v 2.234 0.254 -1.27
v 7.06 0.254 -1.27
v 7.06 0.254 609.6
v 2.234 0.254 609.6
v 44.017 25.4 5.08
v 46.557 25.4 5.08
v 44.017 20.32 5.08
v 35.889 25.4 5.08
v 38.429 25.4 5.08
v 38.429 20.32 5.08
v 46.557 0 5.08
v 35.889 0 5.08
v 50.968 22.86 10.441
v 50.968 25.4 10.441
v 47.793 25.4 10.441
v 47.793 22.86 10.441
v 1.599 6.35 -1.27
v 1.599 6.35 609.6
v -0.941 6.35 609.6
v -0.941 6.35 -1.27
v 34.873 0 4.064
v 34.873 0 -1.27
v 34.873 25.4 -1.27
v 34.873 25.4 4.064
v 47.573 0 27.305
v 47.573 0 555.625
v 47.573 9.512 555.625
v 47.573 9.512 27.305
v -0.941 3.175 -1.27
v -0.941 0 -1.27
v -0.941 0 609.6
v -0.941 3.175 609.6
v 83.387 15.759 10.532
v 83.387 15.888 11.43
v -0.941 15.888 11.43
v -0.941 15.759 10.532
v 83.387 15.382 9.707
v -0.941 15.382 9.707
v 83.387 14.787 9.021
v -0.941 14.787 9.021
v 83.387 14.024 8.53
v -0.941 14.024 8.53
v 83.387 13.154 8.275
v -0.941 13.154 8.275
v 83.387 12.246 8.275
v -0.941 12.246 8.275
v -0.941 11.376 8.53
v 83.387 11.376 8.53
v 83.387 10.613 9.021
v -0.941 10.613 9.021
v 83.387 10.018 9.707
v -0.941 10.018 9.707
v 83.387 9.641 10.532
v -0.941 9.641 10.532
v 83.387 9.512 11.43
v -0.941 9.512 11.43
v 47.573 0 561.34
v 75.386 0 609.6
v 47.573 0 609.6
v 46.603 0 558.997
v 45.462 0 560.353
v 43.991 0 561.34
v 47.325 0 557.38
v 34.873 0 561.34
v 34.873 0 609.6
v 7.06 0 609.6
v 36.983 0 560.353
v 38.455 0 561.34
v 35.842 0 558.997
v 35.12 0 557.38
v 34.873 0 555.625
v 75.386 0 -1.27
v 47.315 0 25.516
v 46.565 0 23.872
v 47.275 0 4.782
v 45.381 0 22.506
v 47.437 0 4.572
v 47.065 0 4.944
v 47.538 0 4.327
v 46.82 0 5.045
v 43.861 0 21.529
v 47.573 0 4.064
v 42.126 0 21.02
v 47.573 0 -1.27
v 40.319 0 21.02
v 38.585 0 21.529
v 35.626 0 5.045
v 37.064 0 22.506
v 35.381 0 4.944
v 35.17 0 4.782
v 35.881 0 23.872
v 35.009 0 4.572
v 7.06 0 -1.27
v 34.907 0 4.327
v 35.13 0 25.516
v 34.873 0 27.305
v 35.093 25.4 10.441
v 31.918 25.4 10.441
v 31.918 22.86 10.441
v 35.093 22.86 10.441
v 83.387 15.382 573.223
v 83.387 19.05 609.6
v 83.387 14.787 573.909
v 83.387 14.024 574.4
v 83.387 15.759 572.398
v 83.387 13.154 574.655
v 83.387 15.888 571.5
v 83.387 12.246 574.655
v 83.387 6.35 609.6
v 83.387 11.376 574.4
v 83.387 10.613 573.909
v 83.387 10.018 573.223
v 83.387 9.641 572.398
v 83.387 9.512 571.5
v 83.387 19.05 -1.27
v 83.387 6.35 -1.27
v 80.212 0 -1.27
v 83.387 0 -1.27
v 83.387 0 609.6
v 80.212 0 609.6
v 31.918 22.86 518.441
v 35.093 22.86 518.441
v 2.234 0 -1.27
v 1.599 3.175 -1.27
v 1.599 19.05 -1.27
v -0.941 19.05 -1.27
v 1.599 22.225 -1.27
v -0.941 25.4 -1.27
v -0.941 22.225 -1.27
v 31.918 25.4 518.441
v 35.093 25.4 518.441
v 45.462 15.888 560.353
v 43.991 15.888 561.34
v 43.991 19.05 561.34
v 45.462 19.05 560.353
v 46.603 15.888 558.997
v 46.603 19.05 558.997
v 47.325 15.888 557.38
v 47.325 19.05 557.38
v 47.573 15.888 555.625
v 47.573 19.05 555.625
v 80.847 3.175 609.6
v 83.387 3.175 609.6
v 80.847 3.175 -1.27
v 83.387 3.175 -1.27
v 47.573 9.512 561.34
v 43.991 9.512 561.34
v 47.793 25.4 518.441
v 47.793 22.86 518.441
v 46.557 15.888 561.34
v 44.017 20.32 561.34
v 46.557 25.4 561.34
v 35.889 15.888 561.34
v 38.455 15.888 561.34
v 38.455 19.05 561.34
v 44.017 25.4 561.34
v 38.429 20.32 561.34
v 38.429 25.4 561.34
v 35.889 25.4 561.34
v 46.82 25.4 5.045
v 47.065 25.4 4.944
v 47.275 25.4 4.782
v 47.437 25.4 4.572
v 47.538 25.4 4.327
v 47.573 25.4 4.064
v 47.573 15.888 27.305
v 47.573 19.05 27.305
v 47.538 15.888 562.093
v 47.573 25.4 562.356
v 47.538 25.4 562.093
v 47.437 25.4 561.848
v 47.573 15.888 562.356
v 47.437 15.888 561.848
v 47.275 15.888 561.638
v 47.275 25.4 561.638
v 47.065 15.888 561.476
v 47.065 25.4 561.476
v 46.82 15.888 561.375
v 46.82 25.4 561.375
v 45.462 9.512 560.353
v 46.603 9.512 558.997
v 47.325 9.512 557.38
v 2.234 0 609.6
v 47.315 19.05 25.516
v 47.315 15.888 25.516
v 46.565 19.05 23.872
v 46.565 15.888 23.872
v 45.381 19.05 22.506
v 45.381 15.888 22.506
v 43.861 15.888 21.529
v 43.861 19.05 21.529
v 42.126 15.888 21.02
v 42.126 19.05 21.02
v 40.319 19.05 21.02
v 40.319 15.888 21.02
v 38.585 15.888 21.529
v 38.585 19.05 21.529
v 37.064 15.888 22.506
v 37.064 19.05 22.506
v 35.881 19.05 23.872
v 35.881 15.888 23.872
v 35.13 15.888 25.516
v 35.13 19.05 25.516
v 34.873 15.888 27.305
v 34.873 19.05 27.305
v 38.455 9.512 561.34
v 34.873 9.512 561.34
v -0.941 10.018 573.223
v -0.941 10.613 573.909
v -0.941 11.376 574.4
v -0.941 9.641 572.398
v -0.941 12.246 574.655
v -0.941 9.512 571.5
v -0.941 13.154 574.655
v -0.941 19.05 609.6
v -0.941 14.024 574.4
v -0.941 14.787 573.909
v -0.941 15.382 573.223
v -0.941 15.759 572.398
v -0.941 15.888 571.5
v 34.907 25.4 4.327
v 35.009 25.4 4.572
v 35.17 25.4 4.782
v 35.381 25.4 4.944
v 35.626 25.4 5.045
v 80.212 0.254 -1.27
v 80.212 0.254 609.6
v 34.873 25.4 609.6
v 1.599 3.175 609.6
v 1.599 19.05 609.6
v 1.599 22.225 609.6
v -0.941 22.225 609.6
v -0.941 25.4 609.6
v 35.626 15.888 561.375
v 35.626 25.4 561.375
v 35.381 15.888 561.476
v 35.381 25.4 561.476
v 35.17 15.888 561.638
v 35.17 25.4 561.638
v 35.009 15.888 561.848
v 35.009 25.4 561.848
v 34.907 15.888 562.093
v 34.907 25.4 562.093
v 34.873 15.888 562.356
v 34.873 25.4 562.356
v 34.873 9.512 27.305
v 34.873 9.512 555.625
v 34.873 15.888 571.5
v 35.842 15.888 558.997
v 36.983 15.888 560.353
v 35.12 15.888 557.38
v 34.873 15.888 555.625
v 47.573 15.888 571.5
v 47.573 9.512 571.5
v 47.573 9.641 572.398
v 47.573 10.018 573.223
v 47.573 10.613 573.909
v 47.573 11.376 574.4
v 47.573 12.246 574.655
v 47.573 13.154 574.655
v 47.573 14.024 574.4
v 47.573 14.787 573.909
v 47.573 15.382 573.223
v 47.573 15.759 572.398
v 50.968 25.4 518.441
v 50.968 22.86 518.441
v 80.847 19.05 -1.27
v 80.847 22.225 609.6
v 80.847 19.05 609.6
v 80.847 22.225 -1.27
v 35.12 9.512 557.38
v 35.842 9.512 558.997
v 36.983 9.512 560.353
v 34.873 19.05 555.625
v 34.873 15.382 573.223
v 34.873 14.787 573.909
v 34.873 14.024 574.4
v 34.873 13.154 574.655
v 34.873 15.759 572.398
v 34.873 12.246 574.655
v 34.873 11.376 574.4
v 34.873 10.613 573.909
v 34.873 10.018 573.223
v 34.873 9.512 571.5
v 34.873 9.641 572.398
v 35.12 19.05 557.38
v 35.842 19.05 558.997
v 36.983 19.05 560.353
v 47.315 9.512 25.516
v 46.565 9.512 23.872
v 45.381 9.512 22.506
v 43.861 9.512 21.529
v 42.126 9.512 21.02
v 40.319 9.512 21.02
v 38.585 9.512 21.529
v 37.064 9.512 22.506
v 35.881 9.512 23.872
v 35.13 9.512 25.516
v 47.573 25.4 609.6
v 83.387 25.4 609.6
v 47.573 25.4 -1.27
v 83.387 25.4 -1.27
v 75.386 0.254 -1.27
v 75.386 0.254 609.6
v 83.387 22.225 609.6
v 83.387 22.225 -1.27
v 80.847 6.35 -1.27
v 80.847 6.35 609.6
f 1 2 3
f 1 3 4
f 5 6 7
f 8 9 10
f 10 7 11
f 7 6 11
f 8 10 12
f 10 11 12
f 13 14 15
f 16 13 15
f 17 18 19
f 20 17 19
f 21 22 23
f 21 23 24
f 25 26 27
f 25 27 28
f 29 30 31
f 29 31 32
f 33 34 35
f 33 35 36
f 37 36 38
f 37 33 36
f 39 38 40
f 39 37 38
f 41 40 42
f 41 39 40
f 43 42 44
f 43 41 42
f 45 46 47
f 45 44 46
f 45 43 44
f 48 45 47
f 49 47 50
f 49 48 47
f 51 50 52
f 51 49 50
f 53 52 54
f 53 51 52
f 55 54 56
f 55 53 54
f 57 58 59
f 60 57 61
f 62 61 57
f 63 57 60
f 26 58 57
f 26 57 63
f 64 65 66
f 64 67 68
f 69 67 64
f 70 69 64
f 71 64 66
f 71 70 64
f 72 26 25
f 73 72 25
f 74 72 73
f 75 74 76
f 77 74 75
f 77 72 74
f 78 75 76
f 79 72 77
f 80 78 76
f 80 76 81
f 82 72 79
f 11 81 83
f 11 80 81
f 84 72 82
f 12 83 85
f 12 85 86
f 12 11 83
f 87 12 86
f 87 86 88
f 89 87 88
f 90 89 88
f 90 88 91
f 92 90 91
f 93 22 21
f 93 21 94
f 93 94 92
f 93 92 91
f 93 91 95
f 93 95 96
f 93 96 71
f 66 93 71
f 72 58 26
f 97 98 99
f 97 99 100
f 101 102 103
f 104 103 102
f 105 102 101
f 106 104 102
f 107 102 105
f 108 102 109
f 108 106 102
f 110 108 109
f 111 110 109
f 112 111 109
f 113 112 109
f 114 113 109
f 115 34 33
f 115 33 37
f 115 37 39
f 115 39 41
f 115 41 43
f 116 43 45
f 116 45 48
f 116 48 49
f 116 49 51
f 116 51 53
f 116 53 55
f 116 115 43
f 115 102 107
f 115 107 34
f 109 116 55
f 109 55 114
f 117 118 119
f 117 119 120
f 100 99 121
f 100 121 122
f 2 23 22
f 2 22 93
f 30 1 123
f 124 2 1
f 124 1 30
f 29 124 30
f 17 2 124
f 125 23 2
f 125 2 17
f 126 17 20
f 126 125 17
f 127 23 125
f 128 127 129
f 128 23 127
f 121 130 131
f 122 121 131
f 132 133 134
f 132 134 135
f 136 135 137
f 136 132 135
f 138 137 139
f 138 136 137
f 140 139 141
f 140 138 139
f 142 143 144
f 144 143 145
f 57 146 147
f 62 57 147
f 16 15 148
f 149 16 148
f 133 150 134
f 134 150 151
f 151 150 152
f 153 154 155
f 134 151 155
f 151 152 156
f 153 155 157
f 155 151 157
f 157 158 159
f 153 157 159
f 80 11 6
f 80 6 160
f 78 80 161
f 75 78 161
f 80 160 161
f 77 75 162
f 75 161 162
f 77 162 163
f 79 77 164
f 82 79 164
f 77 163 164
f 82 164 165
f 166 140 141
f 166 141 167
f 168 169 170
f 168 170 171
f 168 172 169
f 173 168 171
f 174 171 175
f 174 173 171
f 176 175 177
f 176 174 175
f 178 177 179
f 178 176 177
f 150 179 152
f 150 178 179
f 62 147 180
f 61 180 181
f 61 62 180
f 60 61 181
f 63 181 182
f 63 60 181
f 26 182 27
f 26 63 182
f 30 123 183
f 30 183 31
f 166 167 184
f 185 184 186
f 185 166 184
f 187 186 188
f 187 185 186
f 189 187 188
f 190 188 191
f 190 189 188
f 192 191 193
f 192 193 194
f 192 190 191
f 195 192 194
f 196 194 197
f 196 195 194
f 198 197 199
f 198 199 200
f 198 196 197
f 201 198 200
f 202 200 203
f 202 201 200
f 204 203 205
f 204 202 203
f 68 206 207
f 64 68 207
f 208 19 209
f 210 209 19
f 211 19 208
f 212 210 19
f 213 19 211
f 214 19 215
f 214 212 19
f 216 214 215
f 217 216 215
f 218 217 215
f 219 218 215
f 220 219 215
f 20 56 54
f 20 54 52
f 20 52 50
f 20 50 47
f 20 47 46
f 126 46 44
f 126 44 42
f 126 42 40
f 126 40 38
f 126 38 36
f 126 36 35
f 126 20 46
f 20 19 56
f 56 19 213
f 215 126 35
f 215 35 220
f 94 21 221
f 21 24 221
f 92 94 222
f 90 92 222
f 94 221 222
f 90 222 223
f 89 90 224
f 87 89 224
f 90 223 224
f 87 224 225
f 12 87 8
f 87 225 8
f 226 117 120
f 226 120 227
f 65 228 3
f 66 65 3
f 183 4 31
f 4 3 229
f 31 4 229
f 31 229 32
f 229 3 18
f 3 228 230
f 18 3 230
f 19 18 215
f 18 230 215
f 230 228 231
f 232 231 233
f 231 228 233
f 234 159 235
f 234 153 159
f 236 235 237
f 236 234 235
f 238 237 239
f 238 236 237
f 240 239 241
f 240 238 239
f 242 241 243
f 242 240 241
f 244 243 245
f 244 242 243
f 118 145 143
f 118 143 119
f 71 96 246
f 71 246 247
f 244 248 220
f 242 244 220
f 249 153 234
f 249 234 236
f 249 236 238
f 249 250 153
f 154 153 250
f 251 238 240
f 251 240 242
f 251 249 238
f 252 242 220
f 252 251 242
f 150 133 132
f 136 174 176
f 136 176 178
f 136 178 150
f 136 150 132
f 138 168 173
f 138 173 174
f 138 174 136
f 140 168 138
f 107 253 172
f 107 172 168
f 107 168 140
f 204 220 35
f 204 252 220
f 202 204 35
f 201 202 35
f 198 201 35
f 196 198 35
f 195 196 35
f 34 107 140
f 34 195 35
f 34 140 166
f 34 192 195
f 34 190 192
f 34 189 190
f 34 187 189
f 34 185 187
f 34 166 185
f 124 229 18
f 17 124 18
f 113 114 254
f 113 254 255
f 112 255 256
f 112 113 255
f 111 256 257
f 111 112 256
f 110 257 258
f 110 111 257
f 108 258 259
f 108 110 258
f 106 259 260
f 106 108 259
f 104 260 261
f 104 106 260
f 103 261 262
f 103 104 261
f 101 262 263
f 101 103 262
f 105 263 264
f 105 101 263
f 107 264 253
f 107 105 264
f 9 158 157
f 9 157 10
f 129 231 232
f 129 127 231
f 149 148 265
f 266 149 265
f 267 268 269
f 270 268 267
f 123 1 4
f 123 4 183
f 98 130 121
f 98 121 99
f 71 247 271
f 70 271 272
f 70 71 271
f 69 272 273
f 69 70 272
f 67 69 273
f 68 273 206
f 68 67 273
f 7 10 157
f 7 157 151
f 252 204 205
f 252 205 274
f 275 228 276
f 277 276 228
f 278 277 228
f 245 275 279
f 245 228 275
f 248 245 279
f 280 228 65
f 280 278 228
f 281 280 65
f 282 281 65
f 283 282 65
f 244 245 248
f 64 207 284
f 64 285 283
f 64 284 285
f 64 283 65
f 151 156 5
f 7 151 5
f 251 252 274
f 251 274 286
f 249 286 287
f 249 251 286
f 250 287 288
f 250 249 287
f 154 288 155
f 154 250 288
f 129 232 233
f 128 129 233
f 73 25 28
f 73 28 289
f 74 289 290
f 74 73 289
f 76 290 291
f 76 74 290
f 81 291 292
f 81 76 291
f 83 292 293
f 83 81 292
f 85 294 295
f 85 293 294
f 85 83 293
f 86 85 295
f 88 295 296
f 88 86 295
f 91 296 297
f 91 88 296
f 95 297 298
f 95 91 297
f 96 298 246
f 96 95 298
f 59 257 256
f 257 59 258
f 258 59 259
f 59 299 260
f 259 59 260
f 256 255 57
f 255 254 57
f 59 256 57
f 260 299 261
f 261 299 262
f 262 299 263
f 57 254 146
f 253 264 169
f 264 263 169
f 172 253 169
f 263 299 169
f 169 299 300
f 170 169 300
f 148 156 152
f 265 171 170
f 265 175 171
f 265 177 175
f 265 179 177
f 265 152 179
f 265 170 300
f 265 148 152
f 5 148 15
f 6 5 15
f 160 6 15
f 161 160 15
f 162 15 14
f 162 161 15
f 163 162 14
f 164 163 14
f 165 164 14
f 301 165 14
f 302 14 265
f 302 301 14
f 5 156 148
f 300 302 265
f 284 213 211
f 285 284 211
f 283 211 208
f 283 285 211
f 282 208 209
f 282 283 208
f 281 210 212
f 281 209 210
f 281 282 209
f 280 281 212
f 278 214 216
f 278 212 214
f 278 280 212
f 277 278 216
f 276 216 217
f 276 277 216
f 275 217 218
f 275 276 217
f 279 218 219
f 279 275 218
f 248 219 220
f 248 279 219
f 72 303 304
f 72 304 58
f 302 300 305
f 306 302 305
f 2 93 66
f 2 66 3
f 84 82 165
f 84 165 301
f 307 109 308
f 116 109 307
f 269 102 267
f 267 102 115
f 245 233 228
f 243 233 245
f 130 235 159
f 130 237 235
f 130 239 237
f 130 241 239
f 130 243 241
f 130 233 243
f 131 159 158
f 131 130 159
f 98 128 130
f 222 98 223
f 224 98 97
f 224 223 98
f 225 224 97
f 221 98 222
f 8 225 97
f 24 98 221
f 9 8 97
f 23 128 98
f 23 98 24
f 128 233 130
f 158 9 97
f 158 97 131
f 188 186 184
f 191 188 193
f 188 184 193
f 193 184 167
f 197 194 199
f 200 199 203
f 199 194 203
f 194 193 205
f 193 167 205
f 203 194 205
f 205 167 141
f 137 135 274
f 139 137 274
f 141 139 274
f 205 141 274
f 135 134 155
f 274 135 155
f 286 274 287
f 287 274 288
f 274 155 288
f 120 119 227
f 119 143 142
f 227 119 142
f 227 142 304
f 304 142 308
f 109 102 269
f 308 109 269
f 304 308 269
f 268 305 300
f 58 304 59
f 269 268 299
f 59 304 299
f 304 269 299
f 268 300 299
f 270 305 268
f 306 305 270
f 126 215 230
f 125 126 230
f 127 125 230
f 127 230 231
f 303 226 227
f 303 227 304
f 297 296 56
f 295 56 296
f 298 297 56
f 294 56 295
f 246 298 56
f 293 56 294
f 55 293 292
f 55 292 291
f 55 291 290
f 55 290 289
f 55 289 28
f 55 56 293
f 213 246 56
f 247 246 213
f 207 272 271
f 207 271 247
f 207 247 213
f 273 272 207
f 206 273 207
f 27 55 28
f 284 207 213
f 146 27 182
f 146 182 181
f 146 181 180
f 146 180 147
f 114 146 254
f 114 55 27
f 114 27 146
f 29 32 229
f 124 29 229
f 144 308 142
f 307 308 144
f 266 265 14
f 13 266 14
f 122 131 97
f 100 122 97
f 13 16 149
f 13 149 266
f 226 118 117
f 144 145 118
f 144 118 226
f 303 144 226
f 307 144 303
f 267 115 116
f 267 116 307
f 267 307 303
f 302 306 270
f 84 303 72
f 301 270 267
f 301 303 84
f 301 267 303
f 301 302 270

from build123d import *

# Parameters (mm, degrees)
BOSS_EXTRUDE1_DEPTH      = 584.2
BOSS_EXTRUDE1_DEPTH_BACK = 1.27
CUT_EXTRUDE1_DEPTH       = 19.05
SKETCH3_W                = 585.47
SKETCH3_H                = 3.175
CUT_EXTRUDE2_DEPTH       = 2.54
SKETCH4_W                = 585.47
SKETCH4_H                = 3.175
CUT_EXTRUDE3_DEPTH       = 2.54
SKETCH5_W                = 585.47
SKETCH5_H                = 3.175
CUT_EXTRUDE4_DEPTH       = 2.54
SKETCH6_W                = 585.47
SKETCH6_H                = 3.175
CUT_EXTRUDE5_DEPTH       = 2.54
CUT_EXTRUDE6_DEPTH       = 591.801160784
CUT_EXTRUDE8_DEPTH       = 591.667532064
FILLET4_R                = 1.016
CUT_EXTRUDE9_DEPTH       = 591.667532064
FILLET5_R                = 1.016
SKETCH12_W               = 3.175
SKETCH12_H               = 508
CUT_EXTRUDE10_DEPTH      = 2.54
BOSS_EXTRUDE3_DEPTH      = 25.4
SKETCH13_W               = 5.588
SKETCH13_H               = 635
CUT_EXTRUDE11_DEPTH      = 5.08


with BuildPart() as part:
    # Sketch1 → Boss-Extrude1 (new, two sides: drawn at the far end of the back side and taken through both)
    with BuildSketch(Plane.XY.offset(-BOSS_EXTRUDE1_DEPTH_BACK)):
        Polygon((83.386650215, 0), (80.211650215, 0), (80.211650215, 0.254), (75.385650215, 0.254), (75.385650215, 0), (7.059650215, 0), (7.059650215, 0.254), (2.233650215, 0.254), (2.233650215, 0), (-0.941349785, 0), (-0.941349785, 25.4), (83.386650215, 25.4), align=None)
    extrude(amount=BOSS_EXTRUDE1_DEPTH + BOSS_EXTRUDE1_DEPTH_BACK)

    # Sketch2 → Cut-Extrude1 (cut)
    with BuildSketch(Plane.XZ):
        with BuildLine():
            Line((34.872650215, 27.305), (34.872650215, 555.625))
            ThreePointArc((34.872650215, 555.625), (41.222650215, 561.975), (47.572650215, 555.625))
            Line((47.572650215, 555.625), (47.572650215, 27.305))
            ThreePointArc((47.572650215, 27.305), (41.222650215, 20.955), (34.872650215, 27.305))
        make_face()
    extrude(amount=-CUT_EXTRUDE1_DEPTH, mode=Mode.SUBTRACT)

    # Sketch3 → Cut-Extrude2 (cut)
    with BuildSketch(Plane(origin=(83.386650215, 0, 0), x_dir=(0, 0, -1), z_dir=(1, 0, 0))):
        with Locations((-291.465, 20.6375)):
            Rectangle(SKETCH3_W, SKETCH3_H)
    extrude(amount=-CUT_EXTRUDE2_DEPTH, mode=Mode.SUBTRACT)

    # Sketch4 → Cut-Extrude3 (cut)
    with BuildSketch(Plane(origin=(83.386650215, 0, 0), x_dir=(0, 0, -1), z_dir=(1, 0, 0))):
        with Locations((-291.465, 4.7625)):
            Rectangle(SKETCH4_W, SKETCH4_H)
    extrude(amount=-CUT_EXTRUDE3_DEPTH, mode=Mode.SUBTRACT)

    # Sketch5 → Cut-Extrude4 (cut)
    with BuildSketch(Plane.ZY.offset(0.941349785)):
        with Locations((291.465, 4.7625)):
            Rectangle(SKETCH5_W, SKETCH5_H)
    extrude(amount=-CUT_EXTRUDE4_DEPTH, mode=Mode.SUBTRACT)

    # Sketch6 → Cut-Extrude5 (cut)
    with BuildSketch(Plane.ZY.offset(0.941349785)):
        with Locations((291.465, 20.6375)):
            Rectangle(SKETCH6_W, SKETCH6_H)
    extrude(amount=-CUT_EXTRUDE5_DEPTH, mode=Mode.SUBTRACT)

    # Sketch7 → Cut-Extrude6 (cut, through all)
    with BuildSketch(Plane(origin=(83.386650215, 0, 0), x_dir=(0, 0, -1), z_dir=(1, 0, 0))):
        with BuildLine():
            Line((-11.43, 9.5123), (-571.5, 9.5123))
            ThreePointArc((-571.5, 9.5123), (-574.6877, 12.7), (-571.5, 15.8877))
            Line((-571.5, 15.8877), (-11.43, 15.8877))
            ThreePointArc((-11.43, 15.8877), (-8.2423, 12.7), (-11.43, 9.5123))
        make_face()
    extrude(amount=-CUT_EXTRUDE6_DEPTH, mode=Mode.SUBTRACT)

    # Sketch10 → Cut-Extrude8 (cut, through all)
    with BuildSketch(Plane(origin=(0, 25.4, 0), x_dir=(1, 0, 0), z_dir=(0, 1, 0))):
        Polygon((41.222650215, -584.2), (47.572650215, -584.2), (47.572650215, -561.34), (34.872650215, -561.34), (34.872650215, -584.2), align=None)
    extrude(amount=-CUT_EXTRUDE8_DEPTH, mode=Mode.SUBTRACT)

    # Fillet4
    fillet4_edges = [part.edges().sort_by_distance(p)[0] for p in [
        (47.572650215, 20.64385, 561.34),
        (34.872650215, 20.64385, 561.34),
    ]]
    fillet(fillet4_edges, radius=FILLET4_R)

    # Sketch9 → Cut-Extrude9 (cut, through all)
    with BuildSketch(Plane.XZ):
        Polygon((47.572650215, -1.27), (34.872650215, -1.27), (34.872650215, 5.08), (41.222650215, 5.08), (47.572650215, 5.08), align=None)
    extrude(amount=-CUT_EXTRUDE9_DEPTH, mode=Mode.SUBTRACT)

    # Fillet5
    fillet5_edges = [part.edges().sort_by_distance(p)[0] for p in [
        (47.572650215, 12.7, 5.08),
        (34.872650215, 12.7, 5.08),
    ]]
    fillet(fillet5_edges, radius=FILLET5_R)

    # Sketch12 → Cut-Extrude10 (cut)
    with BuildSketch(Plane(origin=(0, 25.4, 0), x_dir=(1, 0, 0), z_dir=(0, 1, 0))):
        with Locations((33.505889839, -264.440775348)):
            Rectangle(SKETCH12_W, SKETCH12_H)
        Polygon((47.793389839, -10.440775348), (47.793389839, -13.508701224), (47.793389839, -20.346727485), (47.793389839, -518.440775348), (50.968389839, -518.440775348), (50.968389839, -10.440775348), align=None)
    extrude(amount=-CUT_EXTRUDE10_DEPTH, mode=Mode.SUBTRACT)

    # Sketch15 → Boss-Extrude3 (add)
    with BuildSketch(Plane.XY.offset(584.2)):
        Polygon((-0.941349785, 25.4), (34.872650215, 25.4), (34.872650215, 0), (7.059650215, 0), (7.059650215, 0.254), (2.233650215, 0.254), (2.233650215, 0), (-0.941349785, 0), (-0.941349785, 3.175), (1.598650215, 3.175), (1.598650215, 6.35), (-0.941349785, 6.35), (-0.941349785, 19.05), (1.598650215, 19.05), (1.598650215, 22.225), (-0.941349785, 22.225), align=None)
        Polygon((47.572650215, 0), (47.572650215, 25.4), (83.386650215, 25.4), (83.386650215, 22.225), (80.846650215, 22.225), (80.846650215, 19.05), (83.386650215, 19.05), (83.386650215, 6.35), (80.846650215, 6.35), (80.846650215, 3.175), (83.386650215, 3.175), (83.386650215, 0), (80.211650215, 0), (80.211650215, 0.254), (75.385650215, 0.254), (75.385650215, 0), align=None)
    extrude(amount=BOSS_EXTRUDE3_DEPTH)

    # Sketch13 → Cut-Extrude11 (cut)
    with BuildSketch(Plane(origin=(0, 25.4, 0), x_dir=(1, 0, 0), z_dir=(0, 1, 0))):
        with Locations((41.222650215, -302.540775348)):
            Rectangle(SKETCH13_W, SKETCH13_H)
    extrude(amount=-CUT_EXTRUDE11_DEPTH, mode=Mode.SUBTRACT)


solid = part.part
